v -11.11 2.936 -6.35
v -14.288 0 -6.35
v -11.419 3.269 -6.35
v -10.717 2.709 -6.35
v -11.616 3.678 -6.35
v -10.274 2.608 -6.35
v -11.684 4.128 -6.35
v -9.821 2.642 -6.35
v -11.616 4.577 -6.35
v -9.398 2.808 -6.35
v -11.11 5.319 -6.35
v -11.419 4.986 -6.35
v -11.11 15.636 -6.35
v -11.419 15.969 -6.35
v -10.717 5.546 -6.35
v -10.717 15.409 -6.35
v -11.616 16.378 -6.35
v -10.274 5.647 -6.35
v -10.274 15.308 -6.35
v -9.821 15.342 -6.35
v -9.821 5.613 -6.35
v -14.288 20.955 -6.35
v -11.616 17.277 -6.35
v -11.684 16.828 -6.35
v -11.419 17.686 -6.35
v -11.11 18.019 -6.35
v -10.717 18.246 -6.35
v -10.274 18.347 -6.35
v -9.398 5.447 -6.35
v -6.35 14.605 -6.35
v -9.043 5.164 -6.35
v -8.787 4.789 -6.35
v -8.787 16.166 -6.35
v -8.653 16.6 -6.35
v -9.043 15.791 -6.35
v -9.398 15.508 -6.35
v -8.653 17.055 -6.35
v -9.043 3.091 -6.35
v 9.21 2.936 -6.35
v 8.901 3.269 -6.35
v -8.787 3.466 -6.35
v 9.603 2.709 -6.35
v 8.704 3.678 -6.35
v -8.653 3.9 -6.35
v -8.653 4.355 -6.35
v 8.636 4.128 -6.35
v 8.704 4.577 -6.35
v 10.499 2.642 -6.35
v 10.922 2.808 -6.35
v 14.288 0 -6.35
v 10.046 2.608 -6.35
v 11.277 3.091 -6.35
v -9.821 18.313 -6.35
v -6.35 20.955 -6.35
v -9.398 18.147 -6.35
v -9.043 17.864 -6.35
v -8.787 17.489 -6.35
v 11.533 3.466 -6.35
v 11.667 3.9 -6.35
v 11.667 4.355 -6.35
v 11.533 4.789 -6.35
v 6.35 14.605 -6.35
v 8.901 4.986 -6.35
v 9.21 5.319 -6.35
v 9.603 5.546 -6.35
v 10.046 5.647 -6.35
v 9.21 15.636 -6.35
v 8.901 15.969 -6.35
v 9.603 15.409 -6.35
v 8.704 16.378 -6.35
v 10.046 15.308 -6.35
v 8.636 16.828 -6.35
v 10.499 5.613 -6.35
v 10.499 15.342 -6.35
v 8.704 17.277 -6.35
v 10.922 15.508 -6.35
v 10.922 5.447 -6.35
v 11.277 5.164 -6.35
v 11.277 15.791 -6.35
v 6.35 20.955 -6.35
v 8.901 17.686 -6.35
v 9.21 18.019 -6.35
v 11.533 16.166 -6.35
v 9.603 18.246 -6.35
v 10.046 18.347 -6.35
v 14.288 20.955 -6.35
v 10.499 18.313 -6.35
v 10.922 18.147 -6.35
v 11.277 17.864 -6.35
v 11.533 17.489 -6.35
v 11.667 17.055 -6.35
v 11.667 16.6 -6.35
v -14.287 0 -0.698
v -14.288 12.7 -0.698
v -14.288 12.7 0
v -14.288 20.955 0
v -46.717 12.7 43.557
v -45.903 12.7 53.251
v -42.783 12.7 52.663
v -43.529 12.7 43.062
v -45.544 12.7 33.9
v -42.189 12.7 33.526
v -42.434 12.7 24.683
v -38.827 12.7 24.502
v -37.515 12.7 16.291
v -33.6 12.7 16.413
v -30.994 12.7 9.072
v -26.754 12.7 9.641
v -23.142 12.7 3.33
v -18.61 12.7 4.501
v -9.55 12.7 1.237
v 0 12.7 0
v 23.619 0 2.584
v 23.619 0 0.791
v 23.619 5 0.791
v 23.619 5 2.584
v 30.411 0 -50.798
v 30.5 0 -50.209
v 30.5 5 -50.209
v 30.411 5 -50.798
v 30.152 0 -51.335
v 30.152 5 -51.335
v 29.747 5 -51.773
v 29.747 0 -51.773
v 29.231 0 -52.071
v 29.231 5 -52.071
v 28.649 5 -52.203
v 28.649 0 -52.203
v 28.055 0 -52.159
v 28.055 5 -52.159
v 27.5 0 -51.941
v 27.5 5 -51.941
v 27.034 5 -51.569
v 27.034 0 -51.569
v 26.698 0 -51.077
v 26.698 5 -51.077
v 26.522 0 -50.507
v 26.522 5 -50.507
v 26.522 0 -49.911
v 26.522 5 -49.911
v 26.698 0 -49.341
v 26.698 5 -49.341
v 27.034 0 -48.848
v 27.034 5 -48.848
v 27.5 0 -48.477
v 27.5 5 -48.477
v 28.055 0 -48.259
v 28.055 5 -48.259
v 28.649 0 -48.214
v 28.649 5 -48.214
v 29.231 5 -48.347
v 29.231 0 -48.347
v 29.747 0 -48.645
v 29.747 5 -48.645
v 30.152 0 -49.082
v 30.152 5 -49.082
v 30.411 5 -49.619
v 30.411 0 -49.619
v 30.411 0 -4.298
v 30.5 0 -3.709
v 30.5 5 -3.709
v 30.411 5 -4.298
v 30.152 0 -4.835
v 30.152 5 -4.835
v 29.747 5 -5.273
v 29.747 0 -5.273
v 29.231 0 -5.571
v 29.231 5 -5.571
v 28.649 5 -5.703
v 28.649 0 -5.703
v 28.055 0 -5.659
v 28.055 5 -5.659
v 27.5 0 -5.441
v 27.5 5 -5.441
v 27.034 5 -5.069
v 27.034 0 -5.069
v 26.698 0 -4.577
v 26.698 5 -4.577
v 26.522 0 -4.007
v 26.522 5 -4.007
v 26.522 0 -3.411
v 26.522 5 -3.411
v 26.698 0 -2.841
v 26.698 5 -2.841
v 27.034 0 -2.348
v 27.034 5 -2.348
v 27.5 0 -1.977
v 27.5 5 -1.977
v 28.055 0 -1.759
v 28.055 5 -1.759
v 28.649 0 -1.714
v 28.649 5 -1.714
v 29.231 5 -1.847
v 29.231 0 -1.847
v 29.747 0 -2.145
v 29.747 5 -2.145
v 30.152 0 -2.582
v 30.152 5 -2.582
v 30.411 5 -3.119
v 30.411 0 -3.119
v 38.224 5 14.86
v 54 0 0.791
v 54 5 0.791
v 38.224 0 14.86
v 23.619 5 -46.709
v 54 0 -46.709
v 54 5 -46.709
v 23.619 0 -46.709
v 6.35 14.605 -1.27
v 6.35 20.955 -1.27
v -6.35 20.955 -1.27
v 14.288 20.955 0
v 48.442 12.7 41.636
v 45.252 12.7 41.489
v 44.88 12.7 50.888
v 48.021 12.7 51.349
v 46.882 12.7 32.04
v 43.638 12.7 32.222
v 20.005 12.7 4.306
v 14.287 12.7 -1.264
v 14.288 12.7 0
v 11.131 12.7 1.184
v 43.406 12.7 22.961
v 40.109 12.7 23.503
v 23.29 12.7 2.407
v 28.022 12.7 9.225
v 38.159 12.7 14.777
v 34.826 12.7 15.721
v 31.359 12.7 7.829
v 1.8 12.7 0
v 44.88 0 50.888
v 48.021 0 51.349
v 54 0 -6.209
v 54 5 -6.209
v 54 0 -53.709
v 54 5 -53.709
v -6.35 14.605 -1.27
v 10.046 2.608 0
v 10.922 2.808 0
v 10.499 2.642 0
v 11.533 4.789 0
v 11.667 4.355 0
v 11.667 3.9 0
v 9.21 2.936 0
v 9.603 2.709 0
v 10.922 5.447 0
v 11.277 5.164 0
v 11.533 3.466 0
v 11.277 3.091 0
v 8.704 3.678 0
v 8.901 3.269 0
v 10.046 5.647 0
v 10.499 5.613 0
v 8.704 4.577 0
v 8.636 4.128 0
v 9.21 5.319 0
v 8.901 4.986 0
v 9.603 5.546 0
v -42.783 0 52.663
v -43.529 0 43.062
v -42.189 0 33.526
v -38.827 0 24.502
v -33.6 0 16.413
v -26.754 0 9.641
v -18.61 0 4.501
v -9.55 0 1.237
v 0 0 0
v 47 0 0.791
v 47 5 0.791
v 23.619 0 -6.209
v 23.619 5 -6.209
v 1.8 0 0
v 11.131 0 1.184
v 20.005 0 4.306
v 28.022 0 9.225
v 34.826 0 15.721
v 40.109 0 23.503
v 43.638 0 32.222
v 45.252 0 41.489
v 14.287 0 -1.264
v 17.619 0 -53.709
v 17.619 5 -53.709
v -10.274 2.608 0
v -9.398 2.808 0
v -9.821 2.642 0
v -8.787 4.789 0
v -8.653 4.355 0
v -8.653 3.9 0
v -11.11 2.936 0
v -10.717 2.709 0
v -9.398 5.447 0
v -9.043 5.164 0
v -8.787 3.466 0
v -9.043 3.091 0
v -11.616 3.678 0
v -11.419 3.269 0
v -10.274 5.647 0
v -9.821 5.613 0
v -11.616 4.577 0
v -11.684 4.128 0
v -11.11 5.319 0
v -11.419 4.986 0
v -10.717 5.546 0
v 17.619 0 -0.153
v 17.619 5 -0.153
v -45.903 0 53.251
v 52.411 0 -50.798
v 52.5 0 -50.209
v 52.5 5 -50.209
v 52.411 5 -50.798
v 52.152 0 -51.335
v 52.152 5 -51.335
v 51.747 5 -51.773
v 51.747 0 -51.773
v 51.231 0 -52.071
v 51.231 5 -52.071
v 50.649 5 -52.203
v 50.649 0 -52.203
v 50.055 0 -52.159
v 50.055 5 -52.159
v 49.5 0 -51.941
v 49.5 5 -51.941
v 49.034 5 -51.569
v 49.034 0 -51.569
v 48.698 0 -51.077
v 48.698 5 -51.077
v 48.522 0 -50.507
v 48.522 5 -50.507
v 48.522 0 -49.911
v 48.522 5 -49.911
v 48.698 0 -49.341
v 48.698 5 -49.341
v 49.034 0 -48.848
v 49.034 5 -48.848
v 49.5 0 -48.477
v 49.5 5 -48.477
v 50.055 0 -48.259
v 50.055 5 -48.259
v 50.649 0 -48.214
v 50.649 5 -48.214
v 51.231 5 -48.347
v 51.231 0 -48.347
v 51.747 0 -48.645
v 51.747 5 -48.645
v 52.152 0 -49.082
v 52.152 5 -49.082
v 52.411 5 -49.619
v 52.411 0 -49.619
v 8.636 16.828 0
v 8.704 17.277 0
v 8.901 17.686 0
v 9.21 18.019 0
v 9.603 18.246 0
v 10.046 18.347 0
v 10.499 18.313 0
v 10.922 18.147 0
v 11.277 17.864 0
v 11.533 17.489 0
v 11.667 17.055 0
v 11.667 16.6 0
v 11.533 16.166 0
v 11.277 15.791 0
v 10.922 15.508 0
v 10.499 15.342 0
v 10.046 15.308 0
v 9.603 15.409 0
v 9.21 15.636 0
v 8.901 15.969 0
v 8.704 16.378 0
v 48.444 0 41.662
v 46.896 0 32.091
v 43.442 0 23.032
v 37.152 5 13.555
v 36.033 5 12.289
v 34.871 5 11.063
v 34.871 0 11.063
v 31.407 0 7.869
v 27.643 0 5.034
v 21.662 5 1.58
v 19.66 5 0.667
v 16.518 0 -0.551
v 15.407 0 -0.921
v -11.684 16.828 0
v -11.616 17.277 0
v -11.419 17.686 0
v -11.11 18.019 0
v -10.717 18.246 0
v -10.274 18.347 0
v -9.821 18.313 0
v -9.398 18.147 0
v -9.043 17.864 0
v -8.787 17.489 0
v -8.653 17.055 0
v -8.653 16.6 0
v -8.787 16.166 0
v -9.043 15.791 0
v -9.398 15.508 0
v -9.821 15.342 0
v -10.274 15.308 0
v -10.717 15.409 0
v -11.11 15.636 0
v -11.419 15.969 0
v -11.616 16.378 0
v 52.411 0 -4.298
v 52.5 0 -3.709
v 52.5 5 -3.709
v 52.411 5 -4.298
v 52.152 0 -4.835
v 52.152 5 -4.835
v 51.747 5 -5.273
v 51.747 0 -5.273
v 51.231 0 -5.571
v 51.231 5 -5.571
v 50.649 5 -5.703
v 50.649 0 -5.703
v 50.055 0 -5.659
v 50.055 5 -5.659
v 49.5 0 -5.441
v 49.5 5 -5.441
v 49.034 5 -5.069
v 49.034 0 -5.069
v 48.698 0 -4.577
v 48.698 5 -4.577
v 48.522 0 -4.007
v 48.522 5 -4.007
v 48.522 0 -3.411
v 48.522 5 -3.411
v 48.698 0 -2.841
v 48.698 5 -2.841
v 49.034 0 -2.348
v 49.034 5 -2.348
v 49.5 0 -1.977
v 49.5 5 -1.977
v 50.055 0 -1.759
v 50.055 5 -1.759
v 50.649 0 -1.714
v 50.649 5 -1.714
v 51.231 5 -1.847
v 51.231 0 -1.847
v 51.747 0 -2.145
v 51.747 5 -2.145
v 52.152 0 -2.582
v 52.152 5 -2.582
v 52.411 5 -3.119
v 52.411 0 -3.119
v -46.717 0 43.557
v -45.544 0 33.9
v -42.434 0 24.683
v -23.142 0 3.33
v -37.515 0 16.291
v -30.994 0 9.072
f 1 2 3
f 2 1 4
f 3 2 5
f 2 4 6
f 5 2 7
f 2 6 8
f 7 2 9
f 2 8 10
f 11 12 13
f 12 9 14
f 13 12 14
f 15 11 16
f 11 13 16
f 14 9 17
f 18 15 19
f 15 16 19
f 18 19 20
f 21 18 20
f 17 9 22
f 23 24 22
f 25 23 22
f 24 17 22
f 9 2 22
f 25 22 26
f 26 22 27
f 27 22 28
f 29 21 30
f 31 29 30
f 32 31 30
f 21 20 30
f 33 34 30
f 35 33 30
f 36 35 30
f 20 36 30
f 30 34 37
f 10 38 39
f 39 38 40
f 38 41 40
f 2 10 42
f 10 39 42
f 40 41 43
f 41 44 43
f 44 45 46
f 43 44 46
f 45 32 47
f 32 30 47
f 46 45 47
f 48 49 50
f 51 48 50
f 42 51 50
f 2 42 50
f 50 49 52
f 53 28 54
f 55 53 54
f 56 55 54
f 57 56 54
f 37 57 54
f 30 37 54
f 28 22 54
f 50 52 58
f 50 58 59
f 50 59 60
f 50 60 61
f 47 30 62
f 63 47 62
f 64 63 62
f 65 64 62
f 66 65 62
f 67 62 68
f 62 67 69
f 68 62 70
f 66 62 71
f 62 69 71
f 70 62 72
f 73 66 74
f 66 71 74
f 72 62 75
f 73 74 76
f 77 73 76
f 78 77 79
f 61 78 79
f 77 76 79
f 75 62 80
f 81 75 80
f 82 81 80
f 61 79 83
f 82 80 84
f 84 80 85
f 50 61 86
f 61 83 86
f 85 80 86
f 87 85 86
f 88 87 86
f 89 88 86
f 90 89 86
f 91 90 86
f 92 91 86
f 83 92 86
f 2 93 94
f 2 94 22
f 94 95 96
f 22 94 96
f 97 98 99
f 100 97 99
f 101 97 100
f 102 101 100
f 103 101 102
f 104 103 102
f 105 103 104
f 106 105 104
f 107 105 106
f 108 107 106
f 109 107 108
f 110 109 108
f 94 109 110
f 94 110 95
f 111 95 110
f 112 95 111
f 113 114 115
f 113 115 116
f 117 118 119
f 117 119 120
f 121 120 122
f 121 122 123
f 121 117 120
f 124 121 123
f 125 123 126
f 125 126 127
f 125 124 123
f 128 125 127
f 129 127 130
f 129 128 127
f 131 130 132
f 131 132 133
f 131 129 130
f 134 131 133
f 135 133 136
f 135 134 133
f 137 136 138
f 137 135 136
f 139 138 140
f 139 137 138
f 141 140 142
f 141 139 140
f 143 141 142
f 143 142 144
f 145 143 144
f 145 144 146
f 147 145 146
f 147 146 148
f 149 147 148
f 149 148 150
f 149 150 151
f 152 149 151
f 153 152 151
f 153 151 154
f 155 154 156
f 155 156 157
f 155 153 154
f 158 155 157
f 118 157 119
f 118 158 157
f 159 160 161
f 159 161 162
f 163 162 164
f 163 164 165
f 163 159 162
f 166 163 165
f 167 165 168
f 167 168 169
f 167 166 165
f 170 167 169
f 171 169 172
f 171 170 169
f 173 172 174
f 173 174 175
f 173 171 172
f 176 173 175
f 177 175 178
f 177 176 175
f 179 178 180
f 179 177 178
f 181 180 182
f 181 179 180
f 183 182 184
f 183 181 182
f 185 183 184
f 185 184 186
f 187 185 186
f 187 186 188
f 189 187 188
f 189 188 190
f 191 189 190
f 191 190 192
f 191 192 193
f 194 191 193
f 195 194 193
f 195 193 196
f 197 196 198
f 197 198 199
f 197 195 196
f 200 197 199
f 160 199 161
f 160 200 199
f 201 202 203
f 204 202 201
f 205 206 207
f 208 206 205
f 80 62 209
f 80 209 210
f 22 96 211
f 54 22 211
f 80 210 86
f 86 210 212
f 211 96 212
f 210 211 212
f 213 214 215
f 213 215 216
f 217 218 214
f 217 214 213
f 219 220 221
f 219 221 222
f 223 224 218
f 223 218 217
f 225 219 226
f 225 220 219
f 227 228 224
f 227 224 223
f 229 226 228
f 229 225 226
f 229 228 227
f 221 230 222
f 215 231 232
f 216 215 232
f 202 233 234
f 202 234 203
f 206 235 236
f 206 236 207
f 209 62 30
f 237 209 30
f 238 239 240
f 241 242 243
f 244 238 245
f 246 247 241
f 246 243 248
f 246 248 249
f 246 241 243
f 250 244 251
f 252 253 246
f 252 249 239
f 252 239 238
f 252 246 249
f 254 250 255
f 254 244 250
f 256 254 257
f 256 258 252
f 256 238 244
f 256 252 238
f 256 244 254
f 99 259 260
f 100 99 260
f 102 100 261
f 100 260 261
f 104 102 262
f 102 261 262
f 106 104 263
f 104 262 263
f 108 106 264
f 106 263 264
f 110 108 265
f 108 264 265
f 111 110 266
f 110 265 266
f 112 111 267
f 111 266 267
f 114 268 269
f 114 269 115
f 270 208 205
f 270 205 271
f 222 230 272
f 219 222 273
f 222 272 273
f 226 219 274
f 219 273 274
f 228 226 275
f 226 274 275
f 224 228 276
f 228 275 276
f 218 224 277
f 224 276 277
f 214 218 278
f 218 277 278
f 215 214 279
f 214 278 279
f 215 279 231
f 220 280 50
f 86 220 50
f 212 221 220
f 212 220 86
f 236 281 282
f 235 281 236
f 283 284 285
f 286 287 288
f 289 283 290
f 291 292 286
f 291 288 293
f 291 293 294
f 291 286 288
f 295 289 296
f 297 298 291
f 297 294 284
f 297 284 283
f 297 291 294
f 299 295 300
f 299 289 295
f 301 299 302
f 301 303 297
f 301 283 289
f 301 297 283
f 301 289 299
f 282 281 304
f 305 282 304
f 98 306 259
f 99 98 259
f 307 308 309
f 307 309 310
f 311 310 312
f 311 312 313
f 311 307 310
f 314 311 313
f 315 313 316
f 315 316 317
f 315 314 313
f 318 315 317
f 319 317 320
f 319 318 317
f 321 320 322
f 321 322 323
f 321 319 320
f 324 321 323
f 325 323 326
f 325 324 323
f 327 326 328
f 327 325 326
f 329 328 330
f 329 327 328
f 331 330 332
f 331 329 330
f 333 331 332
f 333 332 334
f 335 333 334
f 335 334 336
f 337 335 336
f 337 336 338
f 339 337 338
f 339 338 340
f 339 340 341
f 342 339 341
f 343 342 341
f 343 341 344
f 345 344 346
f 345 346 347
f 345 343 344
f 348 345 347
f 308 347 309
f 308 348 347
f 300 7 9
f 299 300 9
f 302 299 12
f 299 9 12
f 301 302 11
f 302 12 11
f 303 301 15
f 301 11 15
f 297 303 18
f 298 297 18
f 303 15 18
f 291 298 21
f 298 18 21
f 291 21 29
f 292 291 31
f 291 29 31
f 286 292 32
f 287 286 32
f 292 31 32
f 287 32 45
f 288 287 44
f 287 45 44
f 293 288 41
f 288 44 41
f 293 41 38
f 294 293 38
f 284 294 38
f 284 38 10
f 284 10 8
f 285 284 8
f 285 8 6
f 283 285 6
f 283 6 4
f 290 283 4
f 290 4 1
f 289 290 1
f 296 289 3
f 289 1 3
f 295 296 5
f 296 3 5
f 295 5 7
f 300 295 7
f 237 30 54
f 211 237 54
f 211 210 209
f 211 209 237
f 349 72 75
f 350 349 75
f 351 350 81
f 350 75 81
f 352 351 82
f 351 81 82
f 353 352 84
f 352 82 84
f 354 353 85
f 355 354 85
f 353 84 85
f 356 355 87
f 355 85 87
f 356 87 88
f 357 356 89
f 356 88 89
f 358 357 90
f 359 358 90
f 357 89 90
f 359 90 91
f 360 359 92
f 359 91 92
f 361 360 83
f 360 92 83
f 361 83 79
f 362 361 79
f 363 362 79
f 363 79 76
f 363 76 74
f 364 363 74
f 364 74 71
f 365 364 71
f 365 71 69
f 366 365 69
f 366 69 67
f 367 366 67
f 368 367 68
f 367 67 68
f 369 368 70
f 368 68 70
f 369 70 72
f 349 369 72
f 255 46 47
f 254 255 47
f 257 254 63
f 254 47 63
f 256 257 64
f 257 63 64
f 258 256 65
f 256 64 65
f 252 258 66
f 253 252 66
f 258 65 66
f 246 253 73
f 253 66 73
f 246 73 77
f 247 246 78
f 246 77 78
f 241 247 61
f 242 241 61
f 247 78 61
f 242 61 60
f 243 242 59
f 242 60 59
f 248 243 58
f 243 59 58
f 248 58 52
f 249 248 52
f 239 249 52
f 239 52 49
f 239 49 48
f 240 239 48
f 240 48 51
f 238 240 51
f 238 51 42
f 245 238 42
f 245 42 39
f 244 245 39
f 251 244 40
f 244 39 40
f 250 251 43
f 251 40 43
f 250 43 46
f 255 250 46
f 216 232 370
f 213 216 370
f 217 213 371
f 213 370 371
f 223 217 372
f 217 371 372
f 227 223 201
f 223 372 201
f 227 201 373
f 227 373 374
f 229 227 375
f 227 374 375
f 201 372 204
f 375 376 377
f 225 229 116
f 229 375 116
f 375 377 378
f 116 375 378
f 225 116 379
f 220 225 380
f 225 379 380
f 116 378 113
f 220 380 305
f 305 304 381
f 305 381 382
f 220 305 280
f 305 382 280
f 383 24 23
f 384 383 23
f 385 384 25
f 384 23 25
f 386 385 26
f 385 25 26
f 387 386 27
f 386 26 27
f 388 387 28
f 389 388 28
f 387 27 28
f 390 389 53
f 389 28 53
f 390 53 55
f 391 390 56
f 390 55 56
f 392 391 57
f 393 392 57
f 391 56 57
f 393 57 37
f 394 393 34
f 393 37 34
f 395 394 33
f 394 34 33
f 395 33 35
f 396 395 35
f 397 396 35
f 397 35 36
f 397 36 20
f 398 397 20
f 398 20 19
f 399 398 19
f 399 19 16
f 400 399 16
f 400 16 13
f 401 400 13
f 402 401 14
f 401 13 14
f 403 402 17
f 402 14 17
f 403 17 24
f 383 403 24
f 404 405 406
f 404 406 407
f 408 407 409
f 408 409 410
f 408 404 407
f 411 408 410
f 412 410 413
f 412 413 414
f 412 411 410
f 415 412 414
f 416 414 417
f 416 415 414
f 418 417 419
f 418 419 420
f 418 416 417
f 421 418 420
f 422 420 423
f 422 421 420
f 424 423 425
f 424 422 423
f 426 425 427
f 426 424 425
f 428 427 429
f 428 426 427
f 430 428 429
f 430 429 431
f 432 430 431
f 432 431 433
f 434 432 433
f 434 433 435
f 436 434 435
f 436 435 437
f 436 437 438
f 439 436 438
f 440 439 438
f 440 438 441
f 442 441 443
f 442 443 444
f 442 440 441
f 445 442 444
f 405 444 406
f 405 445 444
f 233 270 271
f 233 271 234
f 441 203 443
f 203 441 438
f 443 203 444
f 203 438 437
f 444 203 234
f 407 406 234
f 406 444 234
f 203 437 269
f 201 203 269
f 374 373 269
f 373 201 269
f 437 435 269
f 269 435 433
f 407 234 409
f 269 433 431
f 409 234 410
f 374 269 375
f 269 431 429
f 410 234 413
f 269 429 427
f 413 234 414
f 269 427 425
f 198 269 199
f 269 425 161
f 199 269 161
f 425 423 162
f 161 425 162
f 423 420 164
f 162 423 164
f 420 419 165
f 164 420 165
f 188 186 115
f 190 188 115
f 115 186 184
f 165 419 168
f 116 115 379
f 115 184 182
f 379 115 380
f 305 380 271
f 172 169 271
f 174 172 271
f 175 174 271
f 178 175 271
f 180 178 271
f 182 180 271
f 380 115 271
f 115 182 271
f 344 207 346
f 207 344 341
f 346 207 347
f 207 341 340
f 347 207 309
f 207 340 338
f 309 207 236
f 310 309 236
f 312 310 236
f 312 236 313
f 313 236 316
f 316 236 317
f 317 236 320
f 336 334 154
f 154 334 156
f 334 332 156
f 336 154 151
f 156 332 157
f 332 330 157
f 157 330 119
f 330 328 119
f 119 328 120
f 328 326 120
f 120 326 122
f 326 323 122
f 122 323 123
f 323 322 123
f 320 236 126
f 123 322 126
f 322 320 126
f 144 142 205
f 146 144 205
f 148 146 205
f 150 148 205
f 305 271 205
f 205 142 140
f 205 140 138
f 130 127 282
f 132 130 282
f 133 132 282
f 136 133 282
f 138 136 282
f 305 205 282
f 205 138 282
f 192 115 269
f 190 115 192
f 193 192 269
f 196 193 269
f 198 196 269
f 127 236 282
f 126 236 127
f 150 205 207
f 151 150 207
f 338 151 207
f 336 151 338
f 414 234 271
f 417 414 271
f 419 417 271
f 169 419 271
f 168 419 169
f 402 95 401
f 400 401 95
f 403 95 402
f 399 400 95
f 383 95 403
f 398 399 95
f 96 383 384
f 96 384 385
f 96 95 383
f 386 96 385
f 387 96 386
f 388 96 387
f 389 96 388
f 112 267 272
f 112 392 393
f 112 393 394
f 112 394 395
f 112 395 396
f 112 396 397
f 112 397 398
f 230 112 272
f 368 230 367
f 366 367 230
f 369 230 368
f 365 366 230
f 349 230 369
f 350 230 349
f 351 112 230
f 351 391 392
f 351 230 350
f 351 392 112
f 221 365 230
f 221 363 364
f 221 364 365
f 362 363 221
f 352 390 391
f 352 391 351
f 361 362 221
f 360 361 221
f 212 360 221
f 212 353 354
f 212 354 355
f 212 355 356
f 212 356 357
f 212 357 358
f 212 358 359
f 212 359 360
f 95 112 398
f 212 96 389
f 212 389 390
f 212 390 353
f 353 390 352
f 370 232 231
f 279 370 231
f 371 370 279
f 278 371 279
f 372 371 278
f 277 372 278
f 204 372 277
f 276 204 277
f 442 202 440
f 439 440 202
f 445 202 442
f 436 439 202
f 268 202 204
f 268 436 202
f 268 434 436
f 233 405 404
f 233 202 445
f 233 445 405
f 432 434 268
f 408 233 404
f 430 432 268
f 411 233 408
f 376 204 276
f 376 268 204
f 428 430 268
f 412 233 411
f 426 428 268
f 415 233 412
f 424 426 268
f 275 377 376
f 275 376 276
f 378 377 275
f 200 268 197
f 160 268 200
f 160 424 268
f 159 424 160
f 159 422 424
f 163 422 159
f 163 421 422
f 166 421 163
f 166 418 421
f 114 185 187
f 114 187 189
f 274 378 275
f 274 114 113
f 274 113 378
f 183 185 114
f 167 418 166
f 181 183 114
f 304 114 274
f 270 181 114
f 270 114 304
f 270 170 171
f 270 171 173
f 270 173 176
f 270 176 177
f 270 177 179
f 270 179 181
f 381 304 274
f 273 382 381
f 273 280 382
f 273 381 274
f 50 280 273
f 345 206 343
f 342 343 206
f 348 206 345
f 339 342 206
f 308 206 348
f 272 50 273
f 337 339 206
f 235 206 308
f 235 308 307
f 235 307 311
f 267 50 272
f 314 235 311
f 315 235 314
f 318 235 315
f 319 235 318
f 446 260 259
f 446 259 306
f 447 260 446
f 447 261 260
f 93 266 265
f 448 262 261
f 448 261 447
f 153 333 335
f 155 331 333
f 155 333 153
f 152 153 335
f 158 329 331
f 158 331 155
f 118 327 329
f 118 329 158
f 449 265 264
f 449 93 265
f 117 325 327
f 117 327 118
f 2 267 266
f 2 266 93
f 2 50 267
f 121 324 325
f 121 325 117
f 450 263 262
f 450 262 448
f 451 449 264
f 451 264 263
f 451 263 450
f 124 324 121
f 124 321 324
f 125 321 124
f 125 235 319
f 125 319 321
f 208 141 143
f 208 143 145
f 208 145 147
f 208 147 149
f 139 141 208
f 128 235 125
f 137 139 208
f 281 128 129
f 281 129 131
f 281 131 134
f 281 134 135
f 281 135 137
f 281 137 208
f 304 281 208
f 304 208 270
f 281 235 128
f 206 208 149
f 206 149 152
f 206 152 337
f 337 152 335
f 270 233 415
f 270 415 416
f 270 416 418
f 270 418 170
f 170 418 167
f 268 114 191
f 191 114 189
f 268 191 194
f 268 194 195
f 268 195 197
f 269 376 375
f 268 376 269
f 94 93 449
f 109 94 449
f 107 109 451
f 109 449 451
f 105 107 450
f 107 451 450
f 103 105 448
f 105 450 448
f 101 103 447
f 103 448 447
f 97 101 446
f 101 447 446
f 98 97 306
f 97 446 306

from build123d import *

# Parameters (mm, degrees)
BOSS_EXTRUDE1_DEPTH = 12.7
SKETCH2_W           = 28.575
SKETCH2_H           = 20.955
BOSS_EXTRUDE2_DEPTH = 6.35
SKETCH2_2_W         = 28.575
SKETCH2_2_H         = 20.955
BOSS_EXTRUDE3_DEPTH = 5.08
SKETCH3_W           = 12.7
SKETCH3_H           = 6.35
CUT_EXTRUDE1_DEPTH  = 5.08
SKETCH4_R           = 1.524
CUT_EXTRUDE2_DEPTH  = 6.35
SKETCH6_R           = 2
BOSS_EXTRUDE4_DEPTH = 5


with BuildPart() as part:
    # Sketch1 → Boss-Extrude1 (new body)
    with BuildSketch(Plane(origin=(0, 0, 0), x_dir=(1, 0, 0), z_dir=(0, 1, 0))):
        with BuildLine():
            Line((-45.903249768, -53.250574222), (-42.783043149, -52.66326199))
            ThreePointArc((-42.783043149, -52.66326199), (0, 0), (44.879778188, -50.888244756))
            Line((44.879778188, -50.888244756), (48.021201665, -51.348770042))
            ThreePointArc((48.021201665, -51.348770042), (-0.064274965, 3.174349339), (-45.903249768, -53.250574222))
        make_face()
    extrude(amount=BOSS_EXTRUDE1_DEPTH)

    # Sketch2 → Boss-Extrude2 (add)
    with BuildSketch(Plane.XY):
        with Locations((0, 10.4775)):
            Rectangle(SKETCH2_W, SKETCH2_H)
    extrude(amount=-BOSS_EXTRUDE2_DEPTH)

    # Sketch2<2> → Boss-Extrude3 (add)
    with BuildSketch(Plane.XY):
        with Locations((0, 10.4775)):
            Rectangle(SKETCH2_2_W, SKETCH2_2_H)
    extrude(amount=-BOSS_EXTRUDE3_DEPTH)

    # Sketch3 → Cut-Extrude1 (cut)
    with BuildSketch(Plane(origin=(0, 0, -6.35), x_dir=(-1, 0, 0), z_dir=(0, 0, -1))):
        with Locations((0, 17.78)):
            Rectangle(SKETCH3_W, SKETCH3_H)
    extrude(amount=-CUT_EXTRUDE1_DEPTH, mode=Mode.SUBTRACT)

    # Sketch4 → Cut-Extrude2 (cut)
    with BuildSketch(Plane(origin=(0, 0, -6.35), x_dir=(-1, 0, 0), z_dir=(0, 0, -1))):
        with Locations((-10.16, 4.1275)):
            Circle(SKETCH4_R)
        with Locations((-10.16, 16.8275)):
            Circle(SKETCH4_R)
        with Locations((10.16, 4.1275)):
            Circle(SKETCH4_R)
        with Locations((10.16, 16.8275)):
            Circle(SKETCH4_R)
    extrude(amount=-CUT_EXTRUDE2_DEPTH, mode=Mode.SUBTRACT)

    # Sketch6 → Boss-Extrude4 (add)
    with BuildSketch(Plane(origin=(0, 0, 0), x_dir=(1, 0, 0), z_dir=(0, 1, 0))):
        Polygon((38.224238065, -14.85997386), (54, -0.791157312), (54, 6.208842688), (23.618693952, 6.208842688), (23.618693952, 46.708842688), (54, 46.708842688), (54, 53.708842688), (17.618693952, 53.708842688), (17.618693952, 46.708842688), (17.618693952, 6.208842688), (17.618693952, -0.791157312), (17.618693952, -2.892477036), (23.618693952, -2.892477036), (23.618693952, -0.791157312), (47, -0.791157312), (34.870951122, -11.062681088), align=None)
        with Locations((28.5, 3.708842688)):
            Circle(SKETCH6_R, mode=Mode.SUBTRACT)
        with Locations((50.5, 3.708842688)):
            Circle(SKETCH6_R, mode=Mode.SUBTRACT)
        with Locations((28.5, 50.208842688)):
            Circle(SKETCH6_R, mode=Mode.SUBTRACT)
        with Locations((50.5, 50.208842688)):
            Circle(SKETCH6_R, mode=Mode.SUBTRACT)
    extrude(amount=BOSS_EXTRUDE4_DEPTH)


solid = part.part
